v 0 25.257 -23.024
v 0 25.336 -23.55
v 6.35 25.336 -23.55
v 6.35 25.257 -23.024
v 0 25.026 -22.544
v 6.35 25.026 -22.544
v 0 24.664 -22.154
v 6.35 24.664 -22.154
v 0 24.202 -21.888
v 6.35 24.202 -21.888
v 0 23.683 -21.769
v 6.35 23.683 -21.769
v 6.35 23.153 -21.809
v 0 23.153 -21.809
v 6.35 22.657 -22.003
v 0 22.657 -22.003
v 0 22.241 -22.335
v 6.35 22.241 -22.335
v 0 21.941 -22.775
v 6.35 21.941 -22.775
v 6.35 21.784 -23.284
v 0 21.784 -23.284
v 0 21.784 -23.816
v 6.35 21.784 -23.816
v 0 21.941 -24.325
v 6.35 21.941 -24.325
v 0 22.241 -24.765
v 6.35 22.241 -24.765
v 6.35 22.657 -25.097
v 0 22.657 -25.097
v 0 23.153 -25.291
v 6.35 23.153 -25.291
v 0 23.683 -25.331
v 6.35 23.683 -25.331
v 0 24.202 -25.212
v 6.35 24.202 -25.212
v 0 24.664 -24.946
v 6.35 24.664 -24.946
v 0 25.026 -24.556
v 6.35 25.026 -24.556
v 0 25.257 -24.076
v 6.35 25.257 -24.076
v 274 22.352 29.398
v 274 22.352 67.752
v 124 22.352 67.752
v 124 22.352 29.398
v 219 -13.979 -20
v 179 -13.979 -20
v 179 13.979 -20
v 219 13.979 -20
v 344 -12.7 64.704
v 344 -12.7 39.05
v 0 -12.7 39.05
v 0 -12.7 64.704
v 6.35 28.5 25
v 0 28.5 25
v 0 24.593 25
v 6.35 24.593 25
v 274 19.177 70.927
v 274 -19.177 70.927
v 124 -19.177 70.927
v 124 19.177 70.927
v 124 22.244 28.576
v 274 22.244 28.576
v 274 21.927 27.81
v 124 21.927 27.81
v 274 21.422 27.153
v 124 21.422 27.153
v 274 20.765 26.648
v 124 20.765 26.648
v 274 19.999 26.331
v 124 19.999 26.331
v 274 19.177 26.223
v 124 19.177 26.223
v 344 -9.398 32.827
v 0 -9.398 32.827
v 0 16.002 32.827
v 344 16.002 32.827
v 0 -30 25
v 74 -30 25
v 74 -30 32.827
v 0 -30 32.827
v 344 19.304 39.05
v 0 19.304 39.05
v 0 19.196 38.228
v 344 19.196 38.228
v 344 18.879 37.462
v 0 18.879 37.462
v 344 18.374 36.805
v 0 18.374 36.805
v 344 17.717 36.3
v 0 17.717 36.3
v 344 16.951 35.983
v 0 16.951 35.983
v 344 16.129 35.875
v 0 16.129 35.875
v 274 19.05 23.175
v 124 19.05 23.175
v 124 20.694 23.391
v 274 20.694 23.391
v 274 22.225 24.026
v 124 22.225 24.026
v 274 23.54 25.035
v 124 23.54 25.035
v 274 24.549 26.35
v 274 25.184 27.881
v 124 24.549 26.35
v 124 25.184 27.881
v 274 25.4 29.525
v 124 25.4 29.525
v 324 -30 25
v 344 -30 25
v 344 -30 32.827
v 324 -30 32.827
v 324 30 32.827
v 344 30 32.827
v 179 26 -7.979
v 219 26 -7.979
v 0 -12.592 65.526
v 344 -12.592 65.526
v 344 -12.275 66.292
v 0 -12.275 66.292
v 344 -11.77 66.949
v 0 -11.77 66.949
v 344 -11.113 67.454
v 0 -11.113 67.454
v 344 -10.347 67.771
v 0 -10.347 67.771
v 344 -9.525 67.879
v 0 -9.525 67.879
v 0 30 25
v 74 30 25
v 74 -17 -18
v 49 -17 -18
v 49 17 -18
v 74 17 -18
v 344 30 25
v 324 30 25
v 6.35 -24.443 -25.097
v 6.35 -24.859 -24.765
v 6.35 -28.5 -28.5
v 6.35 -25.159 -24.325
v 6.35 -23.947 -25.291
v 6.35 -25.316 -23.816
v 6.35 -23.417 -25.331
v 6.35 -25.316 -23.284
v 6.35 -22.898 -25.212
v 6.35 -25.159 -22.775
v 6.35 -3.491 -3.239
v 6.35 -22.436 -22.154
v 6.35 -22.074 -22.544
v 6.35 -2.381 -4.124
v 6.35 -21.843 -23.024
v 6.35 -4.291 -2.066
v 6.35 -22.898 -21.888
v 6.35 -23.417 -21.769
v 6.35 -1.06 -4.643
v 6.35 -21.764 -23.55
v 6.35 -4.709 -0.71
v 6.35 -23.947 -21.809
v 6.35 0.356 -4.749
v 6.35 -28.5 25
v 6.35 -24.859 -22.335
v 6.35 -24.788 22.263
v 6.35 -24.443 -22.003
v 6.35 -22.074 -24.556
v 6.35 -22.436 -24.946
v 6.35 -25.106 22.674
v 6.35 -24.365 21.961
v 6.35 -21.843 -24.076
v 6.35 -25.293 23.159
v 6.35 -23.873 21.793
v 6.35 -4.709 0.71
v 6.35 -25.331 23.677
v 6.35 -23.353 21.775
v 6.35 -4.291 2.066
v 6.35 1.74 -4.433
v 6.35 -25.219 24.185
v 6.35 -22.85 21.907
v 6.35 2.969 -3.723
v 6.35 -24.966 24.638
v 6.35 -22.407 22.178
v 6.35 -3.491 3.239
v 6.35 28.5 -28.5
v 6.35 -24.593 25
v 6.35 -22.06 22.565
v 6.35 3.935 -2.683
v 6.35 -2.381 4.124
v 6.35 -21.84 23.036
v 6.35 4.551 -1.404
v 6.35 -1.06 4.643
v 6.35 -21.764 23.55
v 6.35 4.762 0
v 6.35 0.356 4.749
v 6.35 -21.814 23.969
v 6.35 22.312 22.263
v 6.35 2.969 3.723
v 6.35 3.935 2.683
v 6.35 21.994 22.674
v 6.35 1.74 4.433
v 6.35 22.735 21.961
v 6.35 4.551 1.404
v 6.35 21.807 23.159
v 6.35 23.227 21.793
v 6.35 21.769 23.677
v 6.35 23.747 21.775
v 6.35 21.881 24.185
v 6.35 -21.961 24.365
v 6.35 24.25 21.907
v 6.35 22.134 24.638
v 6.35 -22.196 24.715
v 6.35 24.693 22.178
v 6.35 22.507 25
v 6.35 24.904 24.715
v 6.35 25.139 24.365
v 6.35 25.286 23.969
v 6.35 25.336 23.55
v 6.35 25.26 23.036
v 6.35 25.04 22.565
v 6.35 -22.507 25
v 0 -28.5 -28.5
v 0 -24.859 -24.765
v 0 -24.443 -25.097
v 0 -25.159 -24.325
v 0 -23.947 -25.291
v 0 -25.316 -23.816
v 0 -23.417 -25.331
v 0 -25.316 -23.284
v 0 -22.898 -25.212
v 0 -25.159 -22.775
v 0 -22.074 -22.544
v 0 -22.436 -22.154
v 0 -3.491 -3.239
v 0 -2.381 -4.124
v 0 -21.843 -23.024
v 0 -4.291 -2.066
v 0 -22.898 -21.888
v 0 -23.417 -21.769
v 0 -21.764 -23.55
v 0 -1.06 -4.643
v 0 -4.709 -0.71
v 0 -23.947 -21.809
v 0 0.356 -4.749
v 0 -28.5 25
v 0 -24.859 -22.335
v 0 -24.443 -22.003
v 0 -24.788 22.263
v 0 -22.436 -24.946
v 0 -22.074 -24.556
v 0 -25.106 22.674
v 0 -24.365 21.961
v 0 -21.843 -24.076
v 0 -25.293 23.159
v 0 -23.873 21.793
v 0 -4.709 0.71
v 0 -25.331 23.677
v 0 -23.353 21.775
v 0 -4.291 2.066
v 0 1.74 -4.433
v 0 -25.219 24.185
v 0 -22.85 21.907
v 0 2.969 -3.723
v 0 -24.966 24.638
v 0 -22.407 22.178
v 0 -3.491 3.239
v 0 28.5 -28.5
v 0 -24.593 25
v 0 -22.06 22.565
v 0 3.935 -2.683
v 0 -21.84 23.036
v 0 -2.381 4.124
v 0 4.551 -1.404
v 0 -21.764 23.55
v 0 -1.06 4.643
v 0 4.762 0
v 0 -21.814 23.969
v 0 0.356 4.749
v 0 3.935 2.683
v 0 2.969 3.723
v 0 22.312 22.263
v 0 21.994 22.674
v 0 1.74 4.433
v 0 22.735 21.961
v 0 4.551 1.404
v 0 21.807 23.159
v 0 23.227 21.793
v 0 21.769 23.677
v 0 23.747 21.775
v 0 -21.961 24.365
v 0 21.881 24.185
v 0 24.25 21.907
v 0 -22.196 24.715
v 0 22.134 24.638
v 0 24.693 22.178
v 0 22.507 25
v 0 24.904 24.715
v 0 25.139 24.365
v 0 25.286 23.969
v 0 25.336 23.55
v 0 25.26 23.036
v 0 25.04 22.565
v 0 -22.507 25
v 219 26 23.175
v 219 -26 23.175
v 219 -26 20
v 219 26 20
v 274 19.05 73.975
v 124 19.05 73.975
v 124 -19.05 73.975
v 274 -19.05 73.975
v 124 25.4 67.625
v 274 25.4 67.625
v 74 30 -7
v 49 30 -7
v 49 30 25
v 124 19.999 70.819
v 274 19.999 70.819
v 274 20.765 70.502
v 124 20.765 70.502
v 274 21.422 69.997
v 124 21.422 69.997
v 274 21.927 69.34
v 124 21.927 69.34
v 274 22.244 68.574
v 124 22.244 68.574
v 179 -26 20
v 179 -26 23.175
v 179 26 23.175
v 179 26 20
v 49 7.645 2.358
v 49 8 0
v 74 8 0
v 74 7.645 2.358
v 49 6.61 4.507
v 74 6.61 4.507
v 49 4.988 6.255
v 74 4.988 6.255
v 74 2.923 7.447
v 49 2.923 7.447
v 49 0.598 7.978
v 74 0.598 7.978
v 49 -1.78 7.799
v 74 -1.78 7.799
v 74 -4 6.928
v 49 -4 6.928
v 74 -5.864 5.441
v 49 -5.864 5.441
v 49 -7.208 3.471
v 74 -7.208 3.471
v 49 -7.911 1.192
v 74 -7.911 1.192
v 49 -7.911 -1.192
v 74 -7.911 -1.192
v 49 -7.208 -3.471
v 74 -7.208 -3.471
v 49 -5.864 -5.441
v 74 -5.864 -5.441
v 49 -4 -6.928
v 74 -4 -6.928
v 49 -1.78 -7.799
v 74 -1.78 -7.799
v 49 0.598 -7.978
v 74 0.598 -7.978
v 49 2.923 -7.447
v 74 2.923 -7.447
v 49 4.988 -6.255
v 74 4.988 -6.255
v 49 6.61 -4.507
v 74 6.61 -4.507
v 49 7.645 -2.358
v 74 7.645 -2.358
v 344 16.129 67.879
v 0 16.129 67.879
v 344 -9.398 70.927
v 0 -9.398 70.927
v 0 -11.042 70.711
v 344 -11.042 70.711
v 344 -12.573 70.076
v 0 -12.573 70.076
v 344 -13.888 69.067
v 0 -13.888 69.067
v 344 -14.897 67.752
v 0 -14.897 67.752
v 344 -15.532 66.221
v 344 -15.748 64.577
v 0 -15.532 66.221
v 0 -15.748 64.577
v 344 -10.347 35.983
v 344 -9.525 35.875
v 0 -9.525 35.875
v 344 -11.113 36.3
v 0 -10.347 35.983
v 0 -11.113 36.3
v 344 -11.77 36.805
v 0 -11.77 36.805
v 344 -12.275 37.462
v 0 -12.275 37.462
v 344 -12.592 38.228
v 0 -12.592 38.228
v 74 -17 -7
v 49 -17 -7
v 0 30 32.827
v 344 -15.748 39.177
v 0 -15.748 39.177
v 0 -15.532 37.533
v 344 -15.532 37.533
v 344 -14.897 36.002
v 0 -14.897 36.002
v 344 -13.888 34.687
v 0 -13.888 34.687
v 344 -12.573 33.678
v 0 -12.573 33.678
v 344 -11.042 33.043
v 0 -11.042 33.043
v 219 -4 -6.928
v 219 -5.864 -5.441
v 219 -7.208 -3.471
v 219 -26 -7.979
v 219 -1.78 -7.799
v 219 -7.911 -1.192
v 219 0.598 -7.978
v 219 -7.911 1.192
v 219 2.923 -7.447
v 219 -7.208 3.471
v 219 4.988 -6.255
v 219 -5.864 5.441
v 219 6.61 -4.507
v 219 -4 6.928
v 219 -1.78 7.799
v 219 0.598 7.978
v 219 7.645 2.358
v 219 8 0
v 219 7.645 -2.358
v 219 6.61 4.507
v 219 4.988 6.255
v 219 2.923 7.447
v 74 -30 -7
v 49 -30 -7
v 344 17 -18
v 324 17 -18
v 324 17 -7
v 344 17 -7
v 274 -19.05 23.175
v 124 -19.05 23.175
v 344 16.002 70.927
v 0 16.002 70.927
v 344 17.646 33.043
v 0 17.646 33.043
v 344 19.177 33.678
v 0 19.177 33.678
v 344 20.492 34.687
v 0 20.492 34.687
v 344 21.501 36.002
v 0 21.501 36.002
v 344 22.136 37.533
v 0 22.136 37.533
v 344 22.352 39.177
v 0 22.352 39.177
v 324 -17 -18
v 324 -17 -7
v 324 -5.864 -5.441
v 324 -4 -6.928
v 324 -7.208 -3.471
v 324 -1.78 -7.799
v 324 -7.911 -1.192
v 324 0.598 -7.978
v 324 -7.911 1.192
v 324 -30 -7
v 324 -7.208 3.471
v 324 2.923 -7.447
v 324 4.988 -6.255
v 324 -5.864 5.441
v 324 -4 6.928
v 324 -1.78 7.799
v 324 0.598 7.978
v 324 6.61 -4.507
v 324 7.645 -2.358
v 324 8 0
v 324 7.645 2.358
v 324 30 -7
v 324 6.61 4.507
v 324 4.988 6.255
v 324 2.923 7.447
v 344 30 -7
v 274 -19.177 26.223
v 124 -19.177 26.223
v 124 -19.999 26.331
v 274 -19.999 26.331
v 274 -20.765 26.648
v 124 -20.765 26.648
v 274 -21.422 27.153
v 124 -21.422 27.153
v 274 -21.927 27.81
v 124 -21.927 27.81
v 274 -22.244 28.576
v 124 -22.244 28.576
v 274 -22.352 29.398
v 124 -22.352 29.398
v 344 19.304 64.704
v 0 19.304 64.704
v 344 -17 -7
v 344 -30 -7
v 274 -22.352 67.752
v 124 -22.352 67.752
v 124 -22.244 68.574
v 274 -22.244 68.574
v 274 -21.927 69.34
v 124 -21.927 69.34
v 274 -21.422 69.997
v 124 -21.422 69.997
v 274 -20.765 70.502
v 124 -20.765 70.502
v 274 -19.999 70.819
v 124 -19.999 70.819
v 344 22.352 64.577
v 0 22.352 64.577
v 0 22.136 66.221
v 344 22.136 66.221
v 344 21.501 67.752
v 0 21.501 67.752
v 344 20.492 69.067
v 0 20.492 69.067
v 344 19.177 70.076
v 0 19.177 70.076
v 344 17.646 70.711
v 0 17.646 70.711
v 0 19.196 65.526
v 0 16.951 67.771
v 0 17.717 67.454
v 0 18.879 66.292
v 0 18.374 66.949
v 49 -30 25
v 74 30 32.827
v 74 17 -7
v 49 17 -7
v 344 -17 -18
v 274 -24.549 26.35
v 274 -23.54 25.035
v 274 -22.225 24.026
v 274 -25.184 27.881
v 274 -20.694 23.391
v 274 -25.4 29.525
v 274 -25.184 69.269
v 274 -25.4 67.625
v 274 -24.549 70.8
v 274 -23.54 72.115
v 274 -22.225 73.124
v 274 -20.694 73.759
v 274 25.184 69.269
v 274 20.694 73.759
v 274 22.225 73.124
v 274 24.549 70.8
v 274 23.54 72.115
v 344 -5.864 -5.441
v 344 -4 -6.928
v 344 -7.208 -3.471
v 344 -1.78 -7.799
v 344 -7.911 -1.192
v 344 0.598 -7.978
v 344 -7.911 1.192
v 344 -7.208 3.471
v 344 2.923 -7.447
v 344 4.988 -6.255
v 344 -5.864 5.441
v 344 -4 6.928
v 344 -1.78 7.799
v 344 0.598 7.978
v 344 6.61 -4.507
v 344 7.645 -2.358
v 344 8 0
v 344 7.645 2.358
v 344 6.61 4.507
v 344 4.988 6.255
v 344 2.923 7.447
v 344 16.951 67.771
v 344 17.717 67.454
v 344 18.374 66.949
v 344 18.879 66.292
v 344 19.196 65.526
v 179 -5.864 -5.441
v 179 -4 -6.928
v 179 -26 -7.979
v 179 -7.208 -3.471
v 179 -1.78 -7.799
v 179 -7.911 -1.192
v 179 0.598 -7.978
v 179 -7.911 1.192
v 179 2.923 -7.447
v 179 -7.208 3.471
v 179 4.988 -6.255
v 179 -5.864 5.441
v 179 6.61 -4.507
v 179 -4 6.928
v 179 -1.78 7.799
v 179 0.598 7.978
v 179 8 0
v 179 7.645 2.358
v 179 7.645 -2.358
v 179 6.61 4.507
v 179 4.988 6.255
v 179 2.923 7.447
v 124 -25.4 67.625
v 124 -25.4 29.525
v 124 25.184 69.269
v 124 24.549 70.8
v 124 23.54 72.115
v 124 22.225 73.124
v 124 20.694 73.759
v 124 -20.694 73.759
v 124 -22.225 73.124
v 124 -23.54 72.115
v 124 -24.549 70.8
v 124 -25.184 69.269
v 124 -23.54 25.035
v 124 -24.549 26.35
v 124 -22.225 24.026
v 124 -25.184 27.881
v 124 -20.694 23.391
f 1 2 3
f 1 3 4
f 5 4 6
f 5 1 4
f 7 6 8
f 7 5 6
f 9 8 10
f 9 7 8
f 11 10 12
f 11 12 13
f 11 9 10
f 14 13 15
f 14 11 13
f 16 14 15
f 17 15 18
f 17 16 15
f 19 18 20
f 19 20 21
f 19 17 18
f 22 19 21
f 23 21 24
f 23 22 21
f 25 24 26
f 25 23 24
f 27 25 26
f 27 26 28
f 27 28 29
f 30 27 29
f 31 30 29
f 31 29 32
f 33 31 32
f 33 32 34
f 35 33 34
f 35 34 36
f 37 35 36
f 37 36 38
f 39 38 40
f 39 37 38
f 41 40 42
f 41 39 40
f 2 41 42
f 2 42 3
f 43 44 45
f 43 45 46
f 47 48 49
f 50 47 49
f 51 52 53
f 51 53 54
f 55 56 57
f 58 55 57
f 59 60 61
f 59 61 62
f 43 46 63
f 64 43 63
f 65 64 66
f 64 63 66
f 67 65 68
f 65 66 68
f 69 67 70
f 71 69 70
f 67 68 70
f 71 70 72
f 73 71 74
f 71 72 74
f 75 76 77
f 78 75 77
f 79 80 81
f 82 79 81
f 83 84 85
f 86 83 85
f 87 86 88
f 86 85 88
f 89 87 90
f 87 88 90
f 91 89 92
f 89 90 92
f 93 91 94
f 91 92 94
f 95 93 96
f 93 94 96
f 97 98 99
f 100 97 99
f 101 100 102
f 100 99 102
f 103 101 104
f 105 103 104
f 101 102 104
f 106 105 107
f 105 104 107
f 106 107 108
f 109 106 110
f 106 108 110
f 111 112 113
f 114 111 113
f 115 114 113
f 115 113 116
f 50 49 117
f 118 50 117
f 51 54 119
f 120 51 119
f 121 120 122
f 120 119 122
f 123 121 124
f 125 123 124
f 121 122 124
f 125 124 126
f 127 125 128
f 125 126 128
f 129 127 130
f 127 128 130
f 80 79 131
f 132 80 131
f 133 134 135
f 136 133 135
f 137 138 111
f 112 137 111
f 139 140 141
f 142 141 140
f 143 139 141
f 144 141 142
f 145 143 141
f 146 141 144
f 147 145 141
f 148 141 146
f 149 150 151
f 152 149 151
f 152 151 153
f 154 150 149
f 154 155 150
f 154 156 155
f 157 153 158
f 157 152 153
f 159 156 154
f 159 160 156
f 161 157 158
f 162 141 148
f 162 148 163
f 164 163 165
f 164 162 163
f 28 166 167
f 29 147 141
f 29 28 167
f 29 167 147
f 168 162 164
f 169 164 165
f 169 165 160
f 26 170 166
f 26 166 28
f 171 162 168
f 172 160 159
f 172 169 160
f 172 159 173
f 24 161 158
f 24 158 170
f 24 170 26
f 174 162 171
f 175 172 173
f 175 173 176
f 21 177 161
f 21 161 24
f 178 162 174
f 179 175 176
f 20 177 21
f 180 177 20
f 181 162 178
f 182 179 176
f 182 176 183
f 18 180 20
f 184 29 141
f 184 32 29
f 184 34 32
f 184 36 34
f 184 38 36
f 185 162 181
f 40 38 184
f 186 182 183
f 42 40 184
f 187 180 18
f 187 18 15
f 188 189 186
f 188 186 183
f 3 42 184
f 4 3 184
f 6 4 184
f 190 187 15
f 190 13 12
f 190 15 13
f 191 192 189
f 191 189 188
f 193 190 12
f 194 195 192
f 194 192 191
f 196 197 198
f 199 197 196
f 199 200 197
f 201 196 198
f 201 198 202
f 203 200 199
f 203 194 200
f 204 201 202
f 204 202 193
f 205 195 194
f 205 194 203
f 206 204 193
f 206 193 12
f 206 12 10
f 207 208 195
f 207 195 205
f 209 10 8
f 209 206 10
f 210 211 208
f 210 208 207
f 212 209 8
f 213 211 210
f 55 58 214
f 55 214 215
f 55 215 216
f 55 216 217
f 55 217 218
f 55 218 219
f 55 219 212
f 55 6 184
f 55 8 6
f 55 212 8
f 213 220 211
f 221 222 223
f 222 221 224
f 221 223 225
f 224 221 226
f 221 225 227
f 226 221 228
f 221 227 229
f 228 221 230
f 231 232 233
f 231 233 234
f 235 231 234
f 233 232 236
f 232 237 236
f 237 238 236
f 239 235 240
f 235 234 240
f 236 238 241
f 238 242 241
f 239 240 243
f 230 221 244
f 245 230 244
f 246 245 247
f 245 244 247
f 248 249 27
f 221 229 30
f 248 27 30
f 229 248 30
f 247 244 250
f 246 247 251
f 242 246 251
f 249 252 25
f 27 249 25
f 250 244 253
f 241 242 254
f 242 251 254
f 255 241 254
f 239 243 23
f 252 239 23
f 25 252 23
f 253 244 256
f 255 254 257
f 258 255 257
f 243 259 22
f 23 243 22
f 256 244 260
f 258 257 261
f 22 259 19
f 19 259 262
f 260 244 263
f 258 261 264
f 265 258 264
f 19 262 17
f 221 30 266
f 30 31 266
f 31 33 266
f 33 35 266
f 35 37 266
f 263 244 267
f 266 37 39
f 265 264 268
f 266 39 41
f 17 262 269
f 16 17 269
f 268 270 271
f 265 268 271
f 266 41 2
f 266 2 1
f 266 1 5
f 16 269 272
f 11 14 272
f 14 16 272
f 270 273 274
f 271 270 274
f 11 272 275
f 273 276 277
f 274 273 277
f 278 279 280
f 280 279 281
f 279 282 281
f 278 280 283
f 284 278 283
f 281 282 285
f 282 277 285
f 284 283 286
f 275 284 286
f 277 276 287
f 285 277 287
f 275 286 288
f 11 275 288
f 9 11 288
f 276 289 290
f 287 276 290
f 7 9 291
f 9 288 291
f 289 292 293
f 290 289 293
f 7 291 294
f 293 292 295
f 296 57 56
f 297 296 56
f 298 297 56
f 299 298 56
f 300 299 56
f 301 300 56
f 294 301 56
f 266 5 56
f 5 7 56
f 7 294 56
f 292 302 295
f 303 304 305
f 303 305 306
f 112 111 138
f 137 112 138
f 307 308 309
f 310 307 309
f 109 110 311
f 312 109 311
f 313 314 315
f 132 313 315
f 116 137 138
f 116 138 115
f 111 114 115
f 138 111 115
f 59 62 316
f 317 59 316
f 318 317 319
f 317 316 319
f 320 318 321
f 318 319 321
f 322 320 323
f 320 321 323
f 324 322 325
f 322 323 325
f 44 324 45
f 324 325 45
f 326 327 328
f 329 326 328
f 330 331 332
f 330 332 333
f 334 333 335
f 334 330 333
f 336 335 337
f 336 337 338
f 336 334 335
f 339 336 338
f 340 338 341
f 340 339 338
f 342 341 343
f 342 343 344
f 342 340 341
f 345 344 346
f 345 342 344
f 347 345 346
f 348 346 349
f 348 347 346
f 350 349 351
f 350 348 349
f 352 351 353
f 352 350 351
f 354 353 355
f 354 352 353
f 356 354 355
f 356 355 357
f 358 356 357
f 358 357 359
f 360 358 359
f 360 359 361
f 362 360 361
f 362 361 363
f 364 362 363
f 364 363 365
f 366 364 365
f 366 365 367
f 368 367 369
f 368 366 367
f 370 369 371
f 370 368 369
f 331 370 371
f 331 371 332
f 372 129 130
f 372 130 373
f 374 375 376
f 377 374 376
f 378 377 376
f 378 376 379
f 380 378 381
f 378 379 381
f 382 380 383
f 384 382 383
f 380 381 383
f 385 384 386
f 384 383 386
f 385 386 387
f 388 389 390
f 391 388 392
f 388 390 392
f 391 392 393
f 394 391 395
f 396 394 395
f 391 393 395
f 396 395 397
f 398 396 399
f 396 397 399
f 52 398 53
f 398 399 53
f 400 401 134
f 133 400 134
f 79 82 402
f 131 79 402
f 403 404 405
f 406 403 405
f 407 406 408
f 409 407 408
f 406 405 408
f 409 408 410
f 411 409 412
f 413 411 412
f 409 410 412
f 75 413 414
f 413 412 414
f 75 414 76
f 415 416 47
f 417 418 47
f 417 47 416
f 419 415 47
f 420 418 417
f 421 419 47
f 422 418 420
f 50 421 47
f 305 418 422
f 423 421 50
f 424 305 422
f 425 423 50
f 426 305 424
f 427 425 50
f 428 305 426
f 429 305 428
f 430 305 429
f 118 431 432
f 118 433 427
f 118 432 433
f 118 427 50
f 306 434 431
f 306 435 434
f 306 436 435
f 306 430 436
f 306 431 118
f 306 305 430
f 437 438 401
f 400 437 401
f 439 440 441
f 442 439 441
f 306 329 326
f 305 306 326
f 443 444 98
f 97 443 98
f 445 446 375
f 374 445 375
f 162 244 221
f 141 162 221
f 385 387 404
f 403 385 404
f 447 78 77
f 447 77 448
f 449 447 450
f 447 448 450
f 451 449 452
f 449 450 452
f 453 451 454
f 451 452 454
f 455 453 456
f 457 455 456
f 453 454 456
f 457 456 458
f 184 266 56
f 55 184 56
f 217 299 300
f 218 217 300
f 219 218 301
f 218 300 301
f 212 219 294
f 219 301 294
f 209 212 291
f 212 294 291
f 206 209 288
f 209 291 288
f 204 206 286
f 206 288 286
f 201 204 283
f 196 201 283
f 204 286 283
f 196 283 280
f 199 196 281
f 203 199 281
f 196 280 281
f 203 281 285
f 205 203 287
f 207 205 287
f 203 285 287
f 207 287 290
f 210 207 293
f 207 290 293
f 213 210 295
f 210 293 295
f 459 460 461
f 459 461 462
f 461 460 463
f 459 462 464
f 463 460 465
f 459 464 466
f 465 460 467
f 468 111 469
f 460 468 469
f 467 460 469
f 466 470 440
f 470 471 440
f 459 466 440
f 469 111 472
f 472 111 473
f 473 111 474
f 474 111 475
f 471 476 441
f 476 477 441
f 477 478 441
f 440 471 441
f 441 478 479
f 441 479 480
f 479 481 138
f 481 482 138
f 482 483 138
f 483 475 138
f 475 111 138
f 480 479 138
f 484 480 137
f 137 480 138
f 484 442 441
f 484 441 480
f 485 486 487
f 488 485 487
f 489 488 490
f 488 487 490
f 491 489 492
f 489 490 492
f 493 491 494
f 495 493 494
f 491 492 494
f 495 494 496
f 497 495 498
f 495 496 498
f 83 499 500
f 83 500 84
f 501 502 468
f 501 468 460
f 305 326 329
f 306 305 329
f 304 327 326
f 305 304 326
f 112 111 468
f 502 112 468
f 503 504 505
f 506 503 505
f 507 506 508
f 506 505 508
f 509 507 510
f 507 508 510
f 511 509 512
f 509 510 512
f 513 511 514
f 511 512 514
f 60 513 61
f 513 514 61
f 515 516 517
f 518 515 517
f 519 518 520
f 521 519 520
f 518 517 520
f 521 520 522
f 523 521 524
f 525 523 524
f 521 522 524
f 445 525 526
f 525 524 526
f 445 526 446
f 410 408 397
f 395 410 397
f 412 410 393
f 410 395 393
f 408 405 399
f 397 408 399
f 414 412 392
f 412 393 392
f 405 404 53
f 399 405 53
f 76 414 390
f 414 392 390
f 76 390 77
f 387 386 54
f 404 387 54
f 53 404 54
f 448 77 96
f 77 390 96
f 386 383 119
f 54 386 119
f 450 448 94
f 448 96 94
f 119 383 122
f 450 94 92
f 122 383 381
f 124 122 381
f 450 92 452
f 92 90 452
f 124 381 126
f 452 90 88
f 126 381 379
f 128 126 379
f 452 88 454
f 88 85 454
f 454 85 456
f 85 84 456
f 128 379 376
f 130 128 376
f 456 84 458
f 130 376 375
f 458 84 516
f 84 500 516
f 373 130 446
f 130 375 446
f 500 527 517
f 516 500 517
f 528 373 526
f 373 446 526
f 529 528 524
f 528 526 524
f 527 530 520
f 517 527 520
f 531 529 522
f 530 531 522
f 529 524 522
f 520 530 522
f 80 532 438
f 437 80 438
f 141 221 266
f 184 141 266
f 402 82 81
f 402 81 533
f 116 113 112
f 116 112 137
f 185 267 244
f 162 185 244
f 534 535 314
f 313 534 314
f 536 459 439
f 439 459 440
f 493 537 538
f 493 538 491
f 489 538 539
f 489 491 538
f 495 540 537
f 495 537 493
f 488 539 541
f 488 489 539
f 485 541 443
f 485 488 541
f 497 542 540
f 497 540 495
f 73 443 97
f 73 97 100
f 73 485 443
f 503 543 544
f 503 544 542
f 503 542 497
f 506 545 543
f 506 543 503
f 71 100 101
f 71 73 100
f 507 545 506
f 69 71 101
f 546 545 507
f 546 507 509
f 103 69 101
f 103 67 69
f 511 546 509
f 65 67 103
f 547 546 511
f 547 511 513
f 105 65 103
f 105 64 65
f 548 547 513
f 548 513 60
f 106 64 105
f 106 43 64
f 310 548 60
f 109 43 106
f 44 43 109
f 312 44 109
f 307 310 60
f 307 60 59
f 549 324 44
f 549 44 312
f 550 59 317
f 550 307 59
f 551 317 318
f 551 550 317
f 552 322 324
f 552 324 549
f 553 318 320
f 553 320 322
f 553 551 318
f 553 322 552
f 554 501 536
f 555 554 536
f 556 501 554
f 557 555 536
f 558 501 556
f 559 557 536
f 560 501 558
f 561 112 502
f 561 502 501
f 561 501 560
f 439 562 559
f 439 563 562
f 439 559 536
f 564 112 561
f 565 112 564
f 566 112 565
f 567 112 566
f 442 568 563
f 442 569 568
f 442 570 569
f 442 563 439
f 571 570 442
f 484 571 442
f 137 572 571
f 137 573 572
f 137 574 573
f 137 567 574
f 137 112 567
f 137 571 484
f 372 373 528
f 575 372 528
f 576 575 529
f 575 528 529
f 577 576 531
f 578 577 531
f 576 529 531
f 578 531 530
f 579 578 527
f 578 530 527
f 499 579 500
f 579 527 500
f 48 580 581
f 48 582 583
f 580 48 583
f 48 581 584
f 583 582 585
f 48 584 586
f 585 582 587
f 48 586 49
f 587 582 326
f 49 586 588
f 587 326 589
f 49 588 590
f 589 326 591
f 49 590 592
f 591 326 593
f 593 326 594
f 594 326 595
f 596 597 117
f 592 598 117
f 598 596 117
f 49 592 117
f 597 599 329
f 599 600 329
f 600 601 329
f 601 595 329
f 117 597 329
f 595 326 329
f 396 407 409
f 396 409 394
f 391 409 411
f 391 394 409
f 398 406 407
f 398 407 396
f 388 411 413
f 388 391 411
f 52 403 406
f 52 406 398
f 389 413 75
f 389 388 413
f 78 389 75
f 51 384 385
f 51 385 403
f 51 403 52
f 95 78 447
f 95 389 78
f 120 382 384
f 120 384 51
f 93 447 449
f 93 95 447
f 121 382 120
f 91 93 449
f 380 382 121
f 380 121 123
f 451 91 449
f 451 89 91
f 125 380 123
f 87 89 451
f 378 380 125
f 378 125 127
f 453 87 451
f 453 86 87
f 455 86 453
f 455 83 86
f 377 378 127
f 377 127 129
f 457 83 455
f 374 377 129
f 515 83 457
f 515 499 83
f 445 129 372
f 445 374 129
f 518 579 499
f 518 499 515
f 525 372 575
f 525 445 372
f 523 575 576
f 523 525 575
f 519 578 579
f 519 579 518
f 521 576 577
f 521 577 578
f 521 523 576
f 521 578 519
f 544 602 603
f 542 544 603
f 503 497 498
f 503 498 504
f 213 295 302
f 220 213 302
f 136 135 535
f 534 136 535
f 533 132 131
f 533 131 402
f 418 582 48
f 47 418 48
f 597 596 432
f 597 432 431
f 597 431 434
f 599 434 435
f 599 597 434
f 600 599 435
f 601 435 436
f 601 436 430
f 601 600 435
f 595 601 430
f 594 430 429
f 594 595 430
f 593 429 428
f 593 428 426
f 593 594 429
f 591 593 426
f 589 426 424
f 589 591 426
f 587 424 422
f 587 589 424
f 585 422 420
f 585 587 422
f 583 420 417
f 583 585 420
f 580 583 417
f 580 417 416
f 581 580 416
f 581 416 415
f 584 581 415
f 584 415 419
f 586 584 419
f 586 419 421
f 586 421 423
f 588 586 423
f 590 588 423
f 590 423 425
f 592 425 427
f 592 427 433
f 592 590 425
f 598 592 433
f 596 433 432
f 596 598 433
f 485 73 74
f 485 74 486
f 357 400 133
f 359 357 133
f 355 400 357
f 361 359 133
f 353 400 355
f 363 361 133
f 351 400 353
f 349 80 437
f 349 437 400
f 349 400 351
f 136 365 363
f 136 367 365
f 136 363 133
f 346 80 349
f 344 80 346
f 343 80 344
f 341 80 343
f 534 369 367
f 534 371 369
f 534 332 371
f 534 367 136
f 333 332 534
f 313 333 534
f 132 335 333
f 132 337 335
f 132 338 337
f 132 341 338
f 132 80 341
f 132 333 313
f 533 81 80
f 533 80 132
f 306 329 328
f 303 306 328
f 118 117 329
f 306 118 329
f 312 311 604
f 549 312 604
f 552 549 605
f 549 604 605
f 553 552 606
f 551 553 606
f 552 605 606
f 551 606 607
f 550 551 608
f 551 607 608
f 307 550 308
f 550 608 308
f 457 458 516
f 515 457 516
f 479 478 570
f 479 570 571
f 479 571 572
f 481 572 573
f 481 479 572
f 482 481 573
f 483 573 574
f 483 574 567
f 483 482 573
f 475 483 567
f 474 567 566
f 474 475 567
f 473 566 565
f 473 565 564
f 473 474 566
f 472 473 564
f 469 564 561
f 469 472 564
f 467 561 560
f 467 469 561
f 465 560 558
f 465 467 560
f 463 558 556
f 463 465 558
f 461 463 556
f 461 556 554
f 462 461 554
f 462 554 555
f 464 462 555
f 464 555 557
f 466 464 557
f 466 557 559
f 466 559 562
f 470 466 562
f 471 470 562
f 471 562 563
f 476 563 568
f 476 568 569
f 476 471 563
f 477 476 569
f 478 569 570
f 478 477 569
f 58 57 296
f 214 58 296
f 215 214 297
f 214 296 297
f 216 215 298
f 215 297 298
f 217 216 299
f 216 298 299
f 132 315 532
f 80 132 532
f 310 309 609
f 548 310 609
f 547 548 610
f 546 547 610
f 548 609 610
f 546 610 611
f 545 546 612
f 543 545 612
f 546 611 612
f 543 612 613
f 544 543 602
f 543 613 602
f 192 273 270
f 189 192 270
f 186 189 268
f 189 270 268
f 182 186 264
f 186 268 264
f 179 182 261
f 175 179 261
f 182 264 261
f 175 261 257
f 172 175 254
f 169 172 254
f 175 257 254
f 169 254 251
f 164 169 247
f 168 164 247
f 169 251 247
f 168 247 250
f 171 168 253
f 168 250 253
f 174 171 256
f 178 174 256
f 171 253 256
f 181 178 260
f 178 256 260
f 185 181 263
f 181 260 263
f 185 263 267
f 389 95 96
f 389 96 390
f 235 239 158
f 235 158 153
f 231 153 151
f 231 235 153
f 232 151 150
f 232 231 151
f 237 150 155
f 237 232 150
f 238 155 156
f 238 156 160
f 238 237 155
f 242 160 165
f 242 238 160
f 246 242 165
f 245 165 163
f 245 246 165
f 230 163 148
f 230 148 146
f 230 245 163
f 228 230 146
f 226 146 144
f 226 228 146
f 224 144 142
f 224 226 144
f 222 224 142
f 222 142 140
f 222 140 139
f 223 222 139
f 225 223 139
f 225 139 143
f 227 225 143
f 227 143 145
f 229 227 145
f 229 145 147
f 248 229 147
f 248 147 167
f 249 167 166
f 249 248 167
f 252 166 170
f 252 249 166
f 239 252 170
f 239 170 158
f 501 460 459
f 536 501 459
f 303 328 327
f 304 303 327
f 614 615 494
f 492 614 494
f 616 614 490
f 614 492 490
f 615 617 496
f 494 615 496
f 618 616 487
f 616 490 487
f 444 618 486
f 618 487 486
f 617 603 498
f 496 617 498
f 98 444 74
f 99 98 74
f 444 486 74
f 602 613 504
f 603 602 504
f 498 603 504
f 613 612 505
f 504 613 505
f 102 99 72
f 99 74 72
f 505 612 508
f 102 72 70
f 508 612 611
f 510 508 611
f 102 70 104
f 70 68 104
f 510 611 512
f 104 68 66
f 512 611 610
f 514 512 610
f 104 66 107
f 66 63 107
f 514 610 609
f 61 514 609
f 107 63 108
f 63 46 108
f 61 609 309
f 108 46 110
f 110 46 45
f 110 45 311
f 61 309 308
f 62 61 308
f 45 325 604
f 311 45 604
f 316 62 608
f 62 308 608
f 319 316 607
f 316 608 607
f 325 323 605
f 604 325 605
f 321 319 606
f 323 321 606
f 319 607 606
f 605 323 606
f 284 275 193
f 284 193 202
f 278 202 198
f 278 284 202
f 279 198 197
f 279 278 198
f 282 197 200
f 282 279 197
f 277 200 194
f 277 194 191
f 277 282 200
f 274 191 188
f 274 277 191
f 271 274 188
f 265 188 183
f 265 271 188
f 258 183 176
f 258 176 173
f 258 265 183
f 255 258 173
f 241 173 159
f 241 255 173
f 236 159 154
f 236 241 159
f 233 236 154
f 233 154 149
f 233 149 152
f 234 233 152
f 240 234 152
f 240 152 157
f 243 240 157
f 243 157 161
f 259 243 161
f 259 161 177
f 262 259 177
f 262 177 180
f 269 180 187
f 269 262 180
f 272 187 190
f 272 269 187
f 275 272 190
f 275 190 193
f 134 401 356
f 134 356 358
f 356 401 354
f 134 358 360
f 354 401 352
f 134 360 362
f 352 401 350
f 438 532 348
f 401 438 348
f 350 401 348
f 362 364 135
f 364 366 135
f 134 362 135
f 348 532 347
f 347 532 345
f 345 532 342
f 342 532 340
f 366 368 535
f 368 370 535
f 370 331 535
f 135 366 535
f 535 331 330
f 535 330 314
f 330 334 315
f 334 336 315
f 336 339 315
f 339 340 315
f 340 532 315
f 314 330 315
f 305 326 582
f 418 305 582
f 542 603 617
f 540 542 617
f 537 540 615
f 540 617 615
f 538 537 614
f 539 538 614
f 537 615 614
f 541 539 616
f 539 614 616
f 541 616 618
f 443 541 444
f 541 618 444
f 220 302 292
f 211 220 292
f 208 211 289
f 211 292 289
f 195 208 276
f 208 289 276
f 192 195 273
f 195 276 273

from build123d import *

# Parameters (mm, degrees)
F4_R      = 1.7859375
F4_R_2    = 4.7625
F6_DEPTH  = 6.35
F7_START  = 49
F3_R      = 8
F7_DEPTH  = 25
F8_START  = 124
F8_DEPTH  = 150
F9_DEPTH  = 344
F10_START = 179
F0_R      = 8
F10_DEPTH = 40
F3_W      = 60
F3_H      = 7.8270026548
F11_DEPTH = 74
F12_START = 324
F12_DEPTH = 20
F13_START = 324
F13_DEPTH = 20
F14_START = 179
F14_DEPTH = 40


# Not quite as in the source:
# - ends of sketch curves that miss each other by under 0.0002 mm in the source are joined


with BuildPart() as f6:
    # F4 (on Right) → F6 (new body, through all)
    with BuildSketch(Plane.YZ):
        with BuildLine():
            ThreePointArc((-22.5073684961, 24.9999973452), (-21.9607159701, 24.3647079392), (-21.7640625, 23.55))
            ThreePointArc((-21.7640625, 23.55), (-24.3647079392, 21.9607159701), (-24.5926315039, 24.9999973452))
            Line((-24.5926315039, 24.9999973452), (-28.5, 24.9999973452))
            Line((-28.5, 24.9999973452), (-28.5, -28.5))
            Line((-28.5, -28.5), (28.5, -28.5))
            Line((28.5, -28.5), (28.5, 24.9999973452))
            Line((28.5, 24.9999973452), (24.5926315039, 24.9999973452))
            ThreePointArc((24.5926315039, 24.9999973452), (25.1392840299, 24.3647079392), (25.3359375, 23.55))
            ThreePointArc((25.3359375, 23.55), (22.7352920608, 21.9607159701), (22.5073684961, 24.9999973452))
            Line((22.5073684961, 24.9999973452), (-22.5073684961, 24.9999973452))
        make_face()
        with Locations((-23.55, -23.55)):
            Circle(F4_R, mode=Mode.SUBTRACT)
        with Locations((23.55, -23.55)):
            Circle(F4_R, mode=Mode.SUBTRACT)
        Circle(F4_R_2, mode=Mode.SUBTRACT)
    extrude(amount=F6_DEPTH)


with BuildPart() as f7:
    # F3 (on Right) → F7 (new body)
    with BuildSketch(Plane.YZ.offset(F7_START)):
        Polygon((30, 24.9999973452), (-30, 25.0000026548), (-30, -6.9999973452), (-17, -6.9999973452), (-17, -17.9999973452), (17, -17.9999973452), (17, -6.9999973452), (30, -6.9999973452), align=None)
        Circle(F3_R, mode=Mode.SUBTRACT)
    extrude(amount=F7_DEPTH)


with BuildPart() as f8:
    # F1 (on Right) → F8 (new body)
    with BuildSketch(Plane.YZ.offset(F8_START)):
        with BuildLine():
            ThreePointArc((25.4, 67.625), (23.5401280605, 72.1151280605), (19.05, 73.975))
            Line((19.05, 73.975), (-19.05, 73.975))
            ThreePointArc((-19.05, 73.975), (-23.5401280605, 72.1151280605), (-25.4, 67.625))
            Line((-25.4, 67.625), (-25.4, 29.525))
            ThreePointArc((-25.4, 29.525), (-23.5401280605, 25.0348719395), (-19.05, 23.175))
            Line((-19.05, 23.175), (19.05, 23.175))
            ThreePointArc((19.05, 23.175), (23.5401280605, 25.0348719395), (25.4, 29.525))
            Line((25.4, 29.525), (25.4, 67.625))
        make_face()
        with BuildLine():
            Line((-19.177, 70.927), (19.177, 70.927))
            ThreePointArc((19.177, 70.927), (21.4220640303, 69.9970640303), (22.352, 67.752))
            Line((22.352, 67.752), (22.352, 29.398))
            ThreePointArc((22.352, 29.398), (21.4220640303, 27.1529359697), (19.177, 26.223))
            Line((19.177, 26.223), (-19.177, 26.223))
            ThreePointArc((-19.177, 26.223), (-21.4220640303, 27.1529359697), (-22.352, 29.398))
            Line((-22.352, 29.398), (-22.352, 67.752))
            ThreePointArc((-22.352, 67.752), (-21.4220640303, 69.9970640303), (-19.177, 70.927))
        make_face(mode=Mode.SUBTRACT)
    extrude(amount=F8_DEPTH)


with BuildPart() as f9:
    # F2 (on Right) → F9 (new body, through all)
    with BuildSketch(Plane.YZ):
        with BuildLine():
            ThreePointArc((22.352, 64.577), (20.4921280605, 69.0671280605), (16.002, 70.927))
            Line((16.002, 70.927), (-9.398, 70.927))
            ThreePointArc((-9.398, 70.927), (-13.8881280605, 69.0671280605), (-15.748, 64.577))
            Line((-15.748, 64.577), (-15.748, 39.177))
            ThreePointArc((-15.748, 39.177), (-13.8881280605, 34.6868719395), (-9.398, 32.827))
            Line((-9.398, 32.827), (16.002, 32.827))
            ThreePointArc((16.002, 32.827), (20.4921280605, 34.6868719395), (22.352, 39.177))
            Line((22.352, 39.177), (22.352, 64.577))
        make_face()
        with BuildLine():
            Line((-9.525, 67.879), (16.129, 67.879))
            ThreePointArc((16.129, 67.879), (18.3740640303, 66.9490640303), (19.304, 64.704))
            Line((19.304, 64.704), (19.304, 39.05))
            ThreePointArc((19.304, 39.05), (18.3740640303, 36.8049359697), (16.129, 35.875))
            Line((16.129, 35.875), (-9.525, 35.875))
            ThreePointArc((-9.525, 35.875), (-11.7700640303, 36.8049359697), (-12.7, 39.05))
            Line((-12.7, 39.05), (-12.7, 64.704))
            ThreePointArc((-12.7, 64.704), (-11.7700640303, 66.9490640303), (-9.525, 67.879))
        make_face(mode=Mode.SUBTRACT)
    extrude(amount=F9_DEPTH)


with BuildPart() as f10:
    # F0 (on Right) → F10 (new body)
    with BuildSketch(Plane.YZ.offset(F10_START)):
        Polygon((26, 20), (-26, 20), (-26, -7.9791847198), (-13.9791847198, -20), (13.9791847198, -20), (26, -7.9791847198), align=None)
        Circle(F0_R, mode=Mode.SUBTRACT)
    extrude(amount=F10_DEPTH)


with BuildPart() as f11:
    # F3 (on Right) → F11 (new body, through all)
    with BuildSketch(Plane.YZ):
        with Locations((0, 28.9134986726)):
            Rectangle(F3_W, F3_H)
    extrude(amount=F11_DEPTH)


with BuildPart() as f12:
    # F3 (on Right) → F12 (new body)
    with BuildSketch(Plane.YZ.offset(F12_START)):
        Polygon((30, 24.9999973452), (-30, 25.0000026548), (-30, -6.9999973452), (-17, -6.9999973452), (-17, -17.9999973452), (17, -17.9999973452), (17, -6.9999973452), (30, -6.9999973452), align=None)
        Circle(F3_R, mode=Mode.SUBTRACT)
    extrude(amount=F12_DEPTH)


with BuildPart() as f13:
    # F3 (on Right) → F13 (new body)
    with BuildSketch(Plane.YZ.offset(F13_START)):
        with Locations((0, 28.9134986726)):
            Rectangle(F3_W, F3_H)
    extrude(amount=F13_DEPTH)


with BuildPart() as f14:
    # F1 (on Right) → F14 (new body)
    with BuildSketch(Plane.YZ.offset(F14_START)):
        Polygon((26, 23.175), (19.05, 23.175), (-19.05, 23.175), (-26, 23.175), (-26, 20), (26, 20), align=None)
    extrude(amount=F14_DEPTH)


solid = Compound([f6.part, f7.part, f8.part, f9.part, f10.part, f11.part, f12.part, f13.part, f14.part])
